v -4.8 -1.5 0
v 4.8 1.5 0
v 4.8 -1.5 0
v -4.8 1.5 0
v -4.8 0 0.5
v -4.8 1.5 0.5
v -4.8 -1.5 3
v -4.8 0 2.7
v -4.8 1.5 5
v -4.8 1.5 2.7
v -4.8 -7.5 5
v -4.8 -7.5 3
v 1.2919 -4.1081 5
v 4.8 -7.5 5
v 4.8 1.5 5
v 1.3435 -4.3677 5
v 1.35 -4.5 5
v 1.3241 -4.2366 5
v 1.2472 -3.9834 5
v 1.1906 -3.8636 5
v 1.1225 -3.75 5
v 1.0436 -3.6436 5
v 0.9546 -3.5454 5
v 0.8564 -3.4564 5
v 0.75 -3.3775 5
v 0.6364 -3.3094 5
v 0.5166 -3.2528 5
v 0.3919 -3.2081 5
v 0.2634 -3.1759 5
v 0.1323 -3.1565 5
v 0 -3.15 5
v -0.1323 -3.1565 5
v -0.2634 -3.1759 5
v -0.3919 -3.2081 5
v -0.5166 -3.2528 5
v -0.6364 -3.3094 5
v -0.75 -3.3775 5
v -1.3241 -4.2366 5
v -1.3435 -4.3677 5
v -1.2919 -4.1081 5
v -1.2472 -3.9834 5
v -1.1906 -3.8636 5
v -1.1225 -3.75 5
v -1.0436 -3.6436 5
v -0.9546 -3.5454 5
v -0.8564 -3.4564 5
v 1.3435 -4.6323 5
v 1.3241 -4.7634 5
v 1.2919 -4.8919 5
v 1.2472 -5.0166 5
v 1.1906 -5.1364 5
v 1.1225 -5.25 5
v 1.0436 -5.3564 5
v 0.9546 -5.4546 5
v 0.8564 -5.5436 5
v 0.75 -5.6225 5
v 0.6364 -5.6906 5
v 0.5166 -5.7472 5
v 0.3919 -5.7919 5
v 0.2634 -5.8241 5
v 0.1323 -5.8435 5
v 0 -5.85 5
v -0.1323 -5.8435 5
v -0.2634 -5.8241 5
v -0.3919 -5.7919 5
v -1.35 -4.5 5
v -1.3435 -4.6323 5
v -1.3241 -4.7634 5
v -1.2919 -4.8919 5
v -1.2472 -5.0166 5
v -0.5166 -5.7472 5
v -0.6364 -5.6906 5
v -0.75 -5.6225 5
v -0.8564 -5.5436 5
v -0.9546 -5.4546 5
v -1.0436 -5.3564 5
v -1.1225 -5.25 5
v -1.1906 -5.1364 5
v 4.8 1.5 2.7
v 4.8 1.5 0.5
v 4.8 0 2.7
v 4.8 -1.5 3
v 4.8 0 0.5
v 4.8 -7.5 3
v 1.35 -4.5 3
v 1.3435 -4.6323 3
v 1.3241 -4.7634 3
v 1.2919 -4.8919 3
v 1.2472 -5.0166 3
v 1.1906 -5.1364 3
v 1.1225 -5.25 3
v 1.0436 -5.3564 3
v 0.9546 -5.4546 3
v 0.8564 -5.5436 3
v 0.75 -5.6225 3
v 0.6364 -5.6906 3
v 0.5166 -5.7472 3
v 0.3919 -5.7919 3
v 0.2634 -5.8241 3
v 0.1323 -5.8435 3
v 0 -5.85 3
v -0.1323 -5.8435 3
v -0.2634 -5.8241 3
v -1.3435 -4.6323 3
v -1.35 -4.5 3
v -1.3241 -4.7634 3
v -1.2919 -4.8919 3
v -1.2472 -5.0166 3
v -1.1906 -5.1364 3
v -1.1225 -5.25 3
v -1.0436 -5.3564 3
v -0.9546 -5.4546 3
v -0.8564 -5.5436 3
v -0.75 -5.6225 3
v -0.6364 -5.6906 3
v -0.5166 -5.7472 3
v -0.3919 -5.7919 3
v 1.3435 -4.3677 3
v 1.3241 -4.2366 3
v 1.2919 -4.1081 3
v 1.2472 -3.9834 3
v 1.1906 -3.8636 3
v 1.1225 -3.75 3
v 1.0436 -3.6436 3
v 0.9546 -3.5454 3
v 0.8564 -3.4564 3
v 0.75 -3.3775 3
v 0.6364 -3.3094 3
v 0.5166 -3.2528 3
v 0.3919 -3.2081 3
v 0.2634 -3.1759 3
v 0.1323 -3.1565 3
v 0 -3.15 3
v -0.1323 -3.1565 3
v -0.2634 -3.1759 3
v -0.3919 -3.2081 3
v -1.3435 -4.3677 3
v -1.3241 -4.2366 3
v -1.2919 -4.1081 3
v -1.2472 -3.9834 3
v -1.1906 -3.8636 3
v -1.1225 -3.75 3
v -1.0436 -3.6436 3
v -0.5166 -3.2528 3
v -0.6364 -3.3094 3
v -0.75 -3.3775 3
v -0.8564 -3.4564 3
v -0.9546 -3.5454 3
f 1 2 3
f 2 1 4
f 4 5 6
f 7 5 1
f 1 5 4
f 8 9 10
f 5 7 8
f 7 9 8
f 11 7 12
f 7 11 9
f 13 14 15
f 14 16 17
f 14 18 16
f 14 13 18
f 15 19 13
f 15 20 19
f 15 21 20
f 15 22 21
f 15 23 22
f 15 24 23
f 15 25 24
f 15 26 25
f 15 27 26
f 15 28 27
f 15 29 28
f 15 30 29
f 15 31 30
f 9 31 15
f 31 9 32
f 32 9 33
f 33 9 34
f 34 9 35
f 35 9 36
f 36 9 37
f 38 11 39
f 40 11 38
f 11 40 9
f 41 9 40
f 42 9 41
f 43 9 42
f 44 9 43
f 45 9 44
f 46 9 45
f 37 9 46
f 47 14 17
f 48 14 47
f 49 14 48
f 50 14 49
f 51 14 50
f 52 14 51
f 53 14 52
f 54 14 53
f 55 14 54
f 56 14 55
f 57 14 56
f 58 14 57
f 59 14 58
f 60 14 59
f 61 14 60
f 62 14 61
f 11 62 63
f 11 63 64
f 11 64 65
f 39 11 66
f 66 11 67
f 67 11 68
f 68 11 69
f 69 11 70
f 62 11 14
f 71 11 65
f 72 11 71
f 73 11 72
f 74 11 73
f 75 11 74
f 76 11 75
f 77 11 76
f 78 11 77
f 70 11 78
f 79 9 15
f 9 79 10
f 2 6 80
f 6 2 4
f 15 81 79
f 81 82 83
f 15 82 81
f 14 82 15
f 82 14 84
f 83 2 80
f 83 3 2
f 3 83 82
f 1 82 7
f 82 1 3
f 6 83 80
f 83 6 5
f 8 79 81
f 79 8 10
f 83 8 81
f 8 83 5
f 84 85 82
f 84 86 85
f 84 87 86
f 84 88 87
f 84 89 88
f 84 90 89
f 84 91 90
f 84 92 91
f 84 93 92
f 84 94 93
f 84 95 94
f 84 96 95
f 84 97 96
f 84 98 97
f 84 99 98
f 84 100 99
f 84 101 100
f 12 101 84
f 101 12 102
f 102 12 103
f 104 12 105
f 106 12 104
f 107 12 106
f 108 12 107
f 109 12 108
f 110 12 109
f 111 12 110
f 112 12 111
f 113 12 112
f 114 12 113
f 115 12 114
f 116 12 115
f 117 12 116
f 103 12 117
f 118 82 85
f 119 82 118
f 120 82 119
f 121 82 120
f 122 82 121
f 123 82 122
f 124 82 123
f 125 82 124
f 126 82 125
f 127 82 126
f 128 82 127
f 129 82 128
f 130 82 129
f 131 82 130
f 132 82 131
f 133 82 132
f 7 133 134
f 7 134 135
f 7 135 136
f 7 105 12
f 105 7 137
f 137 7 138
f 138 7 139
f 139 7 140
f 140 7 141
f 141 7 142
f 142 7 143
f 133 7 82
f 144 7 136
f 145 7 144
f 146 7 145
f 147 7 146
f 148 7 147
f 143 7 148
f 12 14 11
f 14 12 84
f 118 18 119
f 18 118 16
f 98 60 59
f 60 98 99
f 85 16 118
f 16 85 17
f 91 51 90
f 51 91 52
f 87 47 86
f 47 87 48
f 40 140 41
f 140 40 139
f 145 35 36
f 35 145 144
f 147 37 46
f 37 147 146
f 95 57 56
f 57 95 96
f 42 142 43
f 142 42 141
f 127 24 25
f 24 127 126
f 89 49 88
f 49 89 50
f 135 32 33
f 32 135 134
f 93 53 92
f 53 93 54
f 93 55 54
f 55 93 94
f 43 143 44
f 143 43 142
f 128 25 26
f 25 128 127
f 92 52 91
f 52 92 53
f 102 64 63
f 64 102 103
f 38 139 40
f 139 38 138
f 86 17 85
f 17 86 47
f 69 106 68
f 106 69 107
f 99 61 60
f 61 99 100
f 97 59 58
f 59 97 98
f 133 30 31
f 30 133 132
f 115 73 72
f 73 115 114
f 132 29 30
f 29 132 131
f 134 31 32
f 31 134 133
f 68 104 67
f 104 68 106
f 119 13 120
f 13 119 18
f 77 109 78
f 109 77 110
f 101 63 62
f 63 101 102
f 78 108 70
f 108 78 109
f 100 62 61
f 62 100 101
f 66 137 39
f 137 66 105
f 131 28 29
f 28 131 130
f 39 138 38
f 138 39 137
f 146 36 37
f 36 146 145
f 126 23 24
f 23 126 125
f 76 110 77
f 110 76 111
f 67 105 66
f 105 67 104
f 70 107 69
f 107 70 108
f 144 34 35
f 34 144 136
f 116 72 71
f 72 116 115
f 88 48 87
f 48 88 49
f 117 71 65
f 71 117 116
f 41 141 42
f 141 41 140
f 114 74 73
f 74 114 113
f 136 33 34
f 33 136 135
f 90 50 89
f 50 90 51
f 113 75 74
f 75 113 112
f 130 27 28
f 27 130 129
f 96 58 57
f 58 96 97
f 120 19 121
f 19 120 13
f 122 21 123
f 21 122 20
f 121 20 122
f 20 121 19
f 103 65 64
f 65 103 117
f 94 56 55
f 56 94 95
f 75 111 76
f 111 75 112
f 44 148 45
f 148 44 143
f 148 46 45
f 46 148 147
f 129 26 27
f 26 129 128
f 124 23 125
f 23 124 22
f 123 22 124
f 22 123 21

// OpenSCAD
// file: 0 - Variables.scad
$fn = 64;

switchHoleClearance =       0.1; // Widens the switch plate holes by the given amount.
printClearance =            0.2; // Clearance necessary for printed parts to fit better. Used for points where one printed part is inserted in another one.

smallSocketClearance =      0.7; // Hotswap Socket Clearance for holes below a size of 1.5mm. 
                                 // Because 3d printers are not that accurate at this size, it is necessary to have a bigger clearance.
                                 // Recommended: "printClearance + Line Width (Slicer)" for PETG it may be necessary to add even more clearance, because of the material expansion.

//
// It should not be necessary to edit one of the followin variables:
//

mxSize =                    14;
mxDistanceToBoard =         5;

pinThicknessR =             0.5   + smallSocketClearance;
pinThicknessL =             0.3   + smallSocketClearance;
pinWidth =                  1.2   + smallSocketClearance;

socketSize =                16;
socketHeight =              2;
switchSocketDia =           4.2   + printClearance;
switchPinsDia =             1.5   + smallSocketClearance;

diodeWidth =                4     + printClearance;
diodeThickness =            2     + printClearance;
diodeWireDia =              0.4   + smallSocketClearance;

restInsetSize =             1     + printClearance;

hsBoardHeight =             1.5;
hsSocketInsetSize =         (socketSize - mxSize)/2 + printClearance;
hsSocketRestHeight =        1;
hsBoardRestHeight =         hsBoardHeight + printClearance;

plateHeight =               2;
plateRestHeight =           plateHeight + printClearance;

topLayerHeight =            mxDistanceToBoard + (socketHeight - hsSocketRestHeight);
middleLayerHeight =         4;
bottomLayerHeight =         6.5;
wallThickness =             3;
floorHeight =               1.5;

bottomLayerScrewHeight =    bottomLayerHeight+middleLayerHeight-hsBoardHeight;

ledRestHeight =             1;
ledRestWidth =              10    + printClearance;

trrsWidth =                 6     + printClearance;
trrsLength =                12.1  + printClearance;
trrsHeight =                5     + printClearance;
trrsSlotThickness =         1;

proMicroWidth =             19    + printClearance;
proMicroLength =            34    + printClearance;
proMicroThickness =         2     + printClearance;
proMicroSlotDepth =         1.5;
proMicroSlotZOffset =       2;
proMicroSlotThickness =     3;
proMicroScrewDiameter =     2.5   + printClearance;

usbWidth =                  10    + printClearance;
usbHeight =                 3.5   + printClearance;

screwHoleDiameter =         3;
screwInsertDiameter =       3.2;
screwPlatePostDiameter =    5;
screwPostDiameter =         6;
// main file
include <0 - Variables.scad>

genProMicroSlot();

module genProMicroSlot(){
    union(){
        difference(){
            linear_extrude(bottomLayerHeight-floorHeight)
            square([proMicroWidth/2, proMicroSlotThickness], center = true);
            
            translate([0,proMicroSlotThickness-(proMicroSlotDepth*1.5),proMicroSlotZOffset-floorHeight])
            linear_extrude(proMicroThickness)
            square([proMicroWidth, proMicroSlotDepth], center = true); 
        } 
        
        difference(){
            translate([0,-4.5,bottomLayerHeight-floorHeight-2])
            linear_extrude(2)
            square([proMicroWidth/2, 6], center = true);
            
            translate([0,-4.5,bottomLayerHeight-floorHeight-2])
            linear_extrude(2)
            circle(d = proMicroScrewDiameter);
        }
    }
}
